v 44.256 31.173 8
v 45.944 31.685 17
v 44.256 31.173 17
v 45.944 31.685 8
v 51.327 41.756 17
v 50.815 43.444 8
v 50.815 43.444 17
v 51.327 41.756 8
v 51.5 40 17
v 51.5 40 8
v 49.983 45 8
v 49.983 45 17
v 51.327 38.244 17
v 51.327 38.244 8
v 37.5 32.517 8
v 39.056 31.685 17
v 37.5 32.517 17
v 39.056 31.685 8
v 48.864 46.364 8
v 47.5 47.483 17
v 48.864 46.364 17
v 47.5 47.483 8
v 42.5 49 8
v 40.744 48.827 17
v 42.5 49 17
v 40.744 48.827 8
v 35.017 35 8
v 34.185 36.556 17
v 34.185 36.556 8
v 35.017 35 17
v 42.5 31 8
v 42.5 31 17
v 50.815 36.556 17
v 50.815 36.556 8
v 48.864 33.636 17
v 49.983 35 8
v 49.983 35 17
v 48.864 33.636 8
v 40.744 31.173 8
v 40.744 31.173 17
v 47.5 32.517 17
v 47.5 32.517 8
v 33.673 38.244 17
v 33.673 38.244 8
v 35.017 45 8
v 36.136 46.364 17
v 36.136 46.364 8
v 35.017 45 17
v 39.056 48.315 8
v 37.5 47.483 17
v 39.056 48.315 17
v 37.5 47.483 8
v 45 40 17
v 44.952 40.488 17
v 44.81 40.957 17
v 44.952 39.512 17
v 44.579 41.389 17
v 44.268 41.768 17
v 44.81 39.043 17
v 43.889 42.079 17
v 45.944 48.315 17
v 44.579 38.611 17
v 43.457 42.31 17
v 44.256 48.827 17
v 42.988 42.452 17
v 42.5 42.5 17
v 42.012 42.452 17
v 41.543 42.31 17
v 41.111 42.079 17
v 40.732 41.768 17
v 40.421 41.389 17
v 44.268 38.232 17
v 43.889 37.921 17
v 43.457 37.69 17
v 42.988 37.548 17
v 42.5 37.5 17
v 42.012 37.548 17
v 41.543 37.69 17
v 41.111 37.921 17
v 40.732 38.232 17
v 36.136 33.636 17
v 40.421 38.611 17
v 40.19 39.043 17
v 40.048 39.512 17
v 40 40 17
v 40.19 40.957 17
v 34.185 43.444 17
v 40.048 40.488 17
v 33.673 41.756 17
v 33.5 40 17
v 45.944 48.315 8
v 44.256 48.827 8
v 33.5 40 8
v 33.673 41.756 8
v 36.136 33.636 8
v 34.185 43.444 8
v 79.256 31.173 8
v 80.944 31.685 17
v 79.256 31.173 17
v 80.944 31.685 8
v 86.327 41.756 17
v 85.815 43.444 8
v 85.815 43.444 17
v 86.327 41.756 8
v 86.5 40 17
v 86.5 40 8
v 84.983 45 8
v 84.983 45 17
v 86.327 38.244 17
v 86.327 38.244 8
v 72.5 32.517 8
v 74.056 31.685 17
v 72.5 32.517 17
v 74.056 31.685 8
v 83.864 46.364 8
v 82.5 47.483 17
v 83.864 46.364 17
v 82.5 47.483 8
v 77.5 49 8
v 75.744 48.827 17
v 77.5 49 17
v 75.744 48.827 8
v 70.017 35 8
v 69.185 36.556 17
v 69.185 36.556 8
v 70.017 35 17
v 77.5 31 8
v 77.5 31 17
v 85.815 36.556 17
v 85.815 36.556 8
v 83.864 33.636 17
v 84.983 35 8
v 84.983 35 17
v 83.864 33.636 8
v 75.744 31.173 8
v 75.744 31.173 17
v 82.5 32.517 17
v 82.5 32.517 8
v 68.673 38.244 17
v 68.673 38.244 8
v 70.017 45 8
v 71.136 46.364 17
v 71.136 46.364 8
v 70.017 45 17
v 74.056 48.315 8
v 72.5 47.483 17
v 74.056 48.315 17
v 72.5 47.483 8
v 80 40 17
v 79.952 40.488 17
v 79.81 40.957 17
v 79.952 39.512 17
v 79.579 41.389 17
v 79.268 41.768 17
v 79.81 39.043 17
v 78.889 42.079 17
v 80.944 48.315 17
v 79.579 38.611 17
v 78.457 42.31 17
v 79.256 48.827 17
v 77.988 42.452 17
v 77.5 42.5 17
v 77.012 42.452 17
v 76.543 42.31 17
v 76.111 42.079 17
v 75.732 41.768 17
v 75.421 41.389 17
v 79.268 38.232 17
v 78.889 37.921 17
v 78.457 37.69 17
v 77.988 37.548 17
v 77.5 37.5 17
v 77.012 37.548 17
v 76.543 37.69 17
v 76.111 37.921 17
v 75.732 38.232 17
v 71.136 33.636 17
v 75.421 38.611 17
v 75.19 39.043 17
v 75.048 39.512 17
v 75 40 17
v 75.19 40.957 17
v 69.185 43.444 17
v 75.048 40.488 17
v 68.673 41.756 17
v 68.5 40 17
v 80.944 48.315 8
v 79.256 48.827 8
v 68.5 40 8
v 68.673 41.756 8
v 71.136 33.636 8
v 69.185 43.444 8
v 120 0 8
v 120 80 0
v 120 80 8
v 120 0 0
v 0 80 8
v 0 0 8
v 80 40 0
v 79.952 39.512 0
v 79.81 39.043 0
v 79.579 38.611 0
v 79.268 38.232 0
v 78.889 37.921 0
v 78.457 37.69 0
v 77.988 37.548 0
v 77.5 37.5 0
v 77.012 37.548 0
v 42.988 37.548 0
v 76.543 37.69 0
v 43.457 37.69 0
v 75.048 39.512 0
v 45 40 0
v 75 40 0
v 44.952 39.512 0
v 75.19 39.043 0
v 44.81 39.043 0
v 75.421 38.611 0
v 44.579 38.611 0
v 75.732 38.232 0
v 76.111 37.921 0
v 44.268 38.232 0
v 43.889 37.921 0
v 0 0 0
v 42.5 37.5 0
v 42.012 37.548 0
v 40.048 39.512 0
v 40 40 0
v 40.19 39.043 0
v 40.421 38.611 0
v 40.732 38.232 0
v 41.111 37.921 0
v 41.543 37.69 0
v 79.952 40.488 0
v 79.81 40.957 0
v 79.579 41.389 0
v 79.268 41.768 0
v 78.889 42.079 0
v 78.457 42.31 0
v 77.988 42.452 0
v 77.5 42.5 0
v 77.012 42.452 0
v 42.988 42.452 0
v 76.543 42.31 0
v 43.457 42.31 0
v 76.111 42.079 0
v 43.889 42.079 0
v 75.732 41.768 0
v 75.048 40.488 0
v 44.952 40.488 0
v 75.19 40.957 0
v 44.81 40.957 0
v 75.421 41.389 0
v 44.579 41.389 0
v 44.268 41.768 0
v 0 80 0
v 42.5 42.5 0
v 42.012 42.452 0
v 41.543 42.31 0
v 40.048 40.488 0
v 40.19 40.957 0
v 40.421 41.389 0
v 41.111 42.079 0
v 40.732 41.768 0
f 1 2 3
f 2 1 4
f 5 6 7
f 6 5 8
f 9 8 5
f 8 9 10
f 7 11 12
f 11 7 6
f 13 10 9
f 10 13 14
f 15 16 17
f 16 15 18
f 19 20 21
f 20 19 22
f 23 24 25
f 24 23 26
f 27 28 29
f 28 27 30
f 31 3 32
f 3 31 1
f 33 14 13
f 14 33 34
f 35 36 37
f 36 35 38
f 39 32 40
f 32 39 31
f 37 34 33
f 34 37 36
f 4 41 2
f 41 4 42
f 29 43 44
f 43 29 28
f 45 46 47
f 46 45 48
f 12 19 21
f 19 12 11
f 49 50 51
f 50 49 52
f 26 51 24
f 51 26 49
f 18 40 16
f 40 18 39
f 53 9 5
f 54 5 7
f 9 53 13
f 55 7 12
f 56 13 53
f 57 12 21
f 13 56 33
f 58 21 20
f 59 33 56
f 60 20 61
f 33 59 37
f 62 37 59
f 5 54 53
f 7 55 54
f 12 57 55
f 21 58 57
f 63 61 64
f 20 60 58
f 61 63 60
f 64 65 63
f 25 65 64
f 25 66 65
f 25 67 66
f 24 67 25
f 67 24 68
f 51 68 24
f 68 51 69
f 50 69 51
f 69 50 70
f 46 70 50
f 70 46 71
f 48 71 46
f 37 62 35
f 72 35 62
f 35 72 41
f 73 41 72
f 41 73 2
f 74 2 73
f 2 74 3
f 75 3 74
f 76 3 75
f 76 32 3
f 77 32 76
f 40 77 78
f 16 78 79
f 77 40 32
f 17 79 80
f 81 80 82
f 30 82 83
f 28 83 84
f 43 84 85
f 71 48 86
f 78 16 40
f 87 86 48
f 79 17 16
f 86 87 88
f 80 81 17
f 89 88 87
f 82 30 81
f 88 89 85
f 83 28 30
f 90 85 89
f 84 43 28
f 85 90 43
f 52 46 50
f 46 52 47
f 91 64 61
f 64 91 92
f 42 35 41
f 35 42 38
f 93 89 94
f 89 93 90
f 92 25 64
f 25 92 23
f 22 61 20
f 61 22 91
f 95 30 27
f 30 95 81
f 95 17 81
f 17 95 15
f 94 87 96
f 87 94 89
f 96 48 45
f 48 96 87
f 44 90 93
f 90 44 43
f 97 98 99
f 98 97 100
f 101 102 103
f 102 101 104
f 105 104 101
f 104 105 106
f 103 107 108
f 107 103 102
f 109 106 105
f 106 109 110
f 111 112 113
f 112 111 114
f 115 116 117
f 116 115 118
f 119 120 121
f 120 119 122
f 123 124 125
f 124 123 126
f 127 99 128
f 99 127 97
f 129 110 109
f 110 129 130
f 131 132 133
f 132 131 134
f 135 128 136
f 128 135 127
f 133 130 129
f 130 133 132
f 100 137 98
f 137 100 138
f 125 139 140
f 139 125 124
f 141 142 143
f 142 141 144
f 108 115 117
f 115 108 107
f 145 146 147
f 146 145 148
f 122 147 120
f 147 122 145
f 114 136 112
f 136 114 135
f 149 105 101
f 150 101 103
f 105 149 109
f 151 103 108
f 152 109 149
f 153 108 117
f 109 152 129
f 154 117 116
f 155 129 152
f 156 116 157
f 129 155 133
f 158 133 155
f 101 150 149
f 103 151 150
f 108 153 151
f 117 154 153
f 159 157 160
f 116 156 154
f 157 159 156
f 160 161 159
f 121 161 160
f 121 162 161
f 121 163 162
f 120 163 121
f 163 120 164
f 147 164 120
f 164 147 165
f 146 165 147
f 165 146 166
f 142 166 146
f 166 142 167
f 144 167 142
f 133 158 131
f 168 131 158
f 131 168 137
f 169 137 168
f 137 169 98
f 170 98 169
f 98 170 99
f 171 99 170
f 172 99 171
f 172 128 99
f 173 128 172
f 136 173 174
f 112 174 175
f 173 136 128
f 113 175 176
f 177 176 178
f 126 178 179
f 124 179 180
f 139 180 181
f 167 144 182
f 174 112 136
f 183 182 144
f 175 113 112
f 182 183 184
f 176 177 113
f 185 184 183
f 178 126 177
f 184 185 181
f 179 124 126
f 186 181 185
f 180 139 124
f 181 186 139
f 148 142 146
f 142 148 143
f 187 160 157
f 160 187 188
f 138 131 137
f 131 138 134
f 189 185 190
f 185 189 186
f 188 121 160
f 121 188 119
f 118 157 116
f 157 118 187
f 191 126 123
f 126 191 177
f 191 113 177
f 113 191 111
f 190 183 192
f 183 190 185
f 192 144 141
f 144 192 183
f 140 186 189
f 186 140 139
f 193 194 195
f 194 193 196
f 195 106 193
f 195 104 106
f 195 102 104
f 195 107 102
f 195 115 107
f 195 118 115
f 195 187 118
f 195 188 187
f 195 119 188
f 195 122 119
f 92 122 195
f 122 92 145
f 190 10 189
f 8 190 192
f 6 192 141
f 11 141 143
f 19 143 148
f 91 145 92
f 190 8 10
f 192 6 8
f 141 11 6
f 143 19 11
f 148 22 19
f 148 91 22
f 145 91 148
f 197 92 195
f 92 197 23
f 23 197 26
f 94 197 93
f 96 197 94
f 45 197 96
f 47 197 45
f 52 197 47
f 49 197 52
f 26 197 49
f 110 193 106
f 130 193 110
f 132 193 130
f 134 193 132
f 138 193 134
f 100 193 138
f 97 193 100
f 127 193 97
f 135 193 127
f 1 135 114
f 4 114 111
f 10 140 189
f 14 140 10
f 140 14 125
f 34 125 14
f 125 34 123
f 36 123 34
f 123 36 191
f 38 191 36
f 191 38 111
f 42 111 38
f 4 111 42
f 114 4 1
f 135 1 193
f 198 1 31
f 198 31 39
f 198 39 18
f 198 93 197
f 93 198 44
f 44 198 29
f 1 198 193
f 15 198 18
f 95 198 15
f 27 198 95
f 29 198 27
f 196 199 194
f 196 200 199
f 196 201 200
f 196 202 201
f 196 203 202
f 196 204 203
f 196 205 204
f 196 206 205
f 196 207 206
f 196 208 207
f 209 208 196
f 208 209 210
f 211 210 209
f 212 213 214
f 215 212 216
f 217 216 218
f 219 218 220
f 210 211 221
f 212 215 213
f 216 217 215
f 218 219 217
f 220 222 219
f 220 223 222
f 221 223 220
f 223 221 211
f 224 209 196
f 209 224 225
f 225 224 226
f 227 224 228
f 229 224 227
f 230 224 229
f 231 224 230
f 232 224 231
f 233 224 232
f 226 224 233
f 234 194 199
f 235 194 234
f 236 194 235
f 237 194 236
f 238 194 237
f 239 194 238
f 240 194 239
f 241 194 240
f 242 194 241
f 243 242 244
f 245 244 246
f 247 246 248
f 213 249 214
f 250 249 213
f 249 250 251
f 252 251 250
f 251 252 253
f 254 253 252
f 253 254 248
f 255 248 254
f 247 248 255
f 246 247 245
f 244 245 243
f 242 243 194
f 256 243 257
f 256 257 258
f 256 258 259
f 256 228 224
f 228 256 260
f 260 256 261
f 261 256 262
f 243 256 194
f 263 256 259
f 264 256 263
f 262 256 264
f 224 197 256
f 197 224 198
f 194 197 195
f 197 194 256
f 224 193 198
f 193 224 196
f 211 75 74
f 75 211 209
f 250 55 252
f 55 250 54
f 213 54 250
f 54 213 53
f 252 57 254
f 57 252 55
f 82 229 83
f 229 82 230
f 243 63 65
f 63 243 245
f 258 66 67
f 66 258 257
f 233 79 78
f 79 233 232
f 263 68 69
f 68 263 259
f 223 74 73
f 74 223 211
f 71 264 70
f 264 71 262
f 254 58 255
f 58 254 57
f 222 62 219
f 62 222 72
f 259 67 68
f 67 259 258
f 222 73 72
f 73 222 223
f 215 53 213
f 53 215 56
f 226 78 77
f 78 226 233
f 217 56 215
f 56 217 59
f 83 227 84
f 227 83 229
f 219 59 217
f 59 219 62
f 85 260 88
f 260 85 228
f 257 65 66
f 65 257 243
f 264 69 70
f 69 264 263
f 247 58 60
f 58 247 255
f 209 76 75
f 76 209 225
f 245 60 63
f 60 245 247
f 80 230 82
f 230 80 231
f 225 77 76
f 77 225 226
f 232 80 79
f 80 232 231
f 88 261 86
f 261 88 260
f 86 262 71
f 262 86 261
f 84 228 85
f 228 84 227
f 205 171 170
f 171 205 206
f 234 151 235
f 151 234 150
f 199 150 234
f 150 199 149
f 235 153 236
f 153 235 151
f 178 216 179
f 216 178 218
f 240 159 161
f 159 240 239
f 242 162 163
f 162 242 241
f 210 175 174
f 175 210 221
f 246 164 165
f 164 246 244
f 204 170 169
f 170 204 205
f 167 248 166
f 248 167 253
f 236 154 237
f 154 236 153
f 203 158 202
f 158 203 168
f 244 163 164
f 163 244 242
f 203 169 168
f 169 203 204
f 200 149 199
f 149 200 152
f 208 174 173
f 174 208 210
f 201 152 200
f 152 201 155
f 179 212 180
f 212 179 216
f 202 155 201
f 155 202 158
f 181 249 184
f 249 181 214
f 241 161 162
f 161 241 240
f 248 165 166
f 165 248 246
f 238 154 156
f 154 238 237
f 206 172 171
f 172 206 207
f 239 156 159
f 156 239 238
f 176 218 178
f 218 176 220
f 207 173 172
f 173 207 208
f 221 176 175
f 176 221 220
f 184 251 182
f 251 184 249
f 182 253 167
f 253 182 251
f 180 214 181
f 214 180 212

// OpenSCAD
$fn = 32;

// ----------------------------------------------------------------------
// Drill jig: two_boss jig
// ----------------------------------------------------------------------

// --- parameters (mm) ---
plate_l = 120;            // plate length, X
plate_w = 80;             // plate width, Y
plate_t = 8;              // plate thickness
boss_d = 18;              // guide boss diameter
boss_h = 10;              // boss height above the plate
guide_d = 5;              // guide hole diameter
boss_pitch = 35;          // boss pitch

n_boss = 2;  // guide bosses
boss_x0 = (plate_l - (n_boss - 1) * boss_pitch) / 2;  // first boss X
boss_top = plate_t - 1 + boss_h;  // boss crown height
total_h = boss_top;  // overall height

difference() {
  union() {
  cube([plate_l, plate_w, plate_t]);
  for (i = [0 : n_boss - 1])
    translate([boss_x0 + i * boss_pitch, plate_w / 2, plate_t - 1])
      cylinder(h = boss_h, d = boss_d);
  }
  for (i = [0 : n_boss - 1])
    translate([boss_x0 + i * boss_pitch, plate_w / 2, -1])
      cylinder(h = plate_t + boss_h, d = guide_d);
}
